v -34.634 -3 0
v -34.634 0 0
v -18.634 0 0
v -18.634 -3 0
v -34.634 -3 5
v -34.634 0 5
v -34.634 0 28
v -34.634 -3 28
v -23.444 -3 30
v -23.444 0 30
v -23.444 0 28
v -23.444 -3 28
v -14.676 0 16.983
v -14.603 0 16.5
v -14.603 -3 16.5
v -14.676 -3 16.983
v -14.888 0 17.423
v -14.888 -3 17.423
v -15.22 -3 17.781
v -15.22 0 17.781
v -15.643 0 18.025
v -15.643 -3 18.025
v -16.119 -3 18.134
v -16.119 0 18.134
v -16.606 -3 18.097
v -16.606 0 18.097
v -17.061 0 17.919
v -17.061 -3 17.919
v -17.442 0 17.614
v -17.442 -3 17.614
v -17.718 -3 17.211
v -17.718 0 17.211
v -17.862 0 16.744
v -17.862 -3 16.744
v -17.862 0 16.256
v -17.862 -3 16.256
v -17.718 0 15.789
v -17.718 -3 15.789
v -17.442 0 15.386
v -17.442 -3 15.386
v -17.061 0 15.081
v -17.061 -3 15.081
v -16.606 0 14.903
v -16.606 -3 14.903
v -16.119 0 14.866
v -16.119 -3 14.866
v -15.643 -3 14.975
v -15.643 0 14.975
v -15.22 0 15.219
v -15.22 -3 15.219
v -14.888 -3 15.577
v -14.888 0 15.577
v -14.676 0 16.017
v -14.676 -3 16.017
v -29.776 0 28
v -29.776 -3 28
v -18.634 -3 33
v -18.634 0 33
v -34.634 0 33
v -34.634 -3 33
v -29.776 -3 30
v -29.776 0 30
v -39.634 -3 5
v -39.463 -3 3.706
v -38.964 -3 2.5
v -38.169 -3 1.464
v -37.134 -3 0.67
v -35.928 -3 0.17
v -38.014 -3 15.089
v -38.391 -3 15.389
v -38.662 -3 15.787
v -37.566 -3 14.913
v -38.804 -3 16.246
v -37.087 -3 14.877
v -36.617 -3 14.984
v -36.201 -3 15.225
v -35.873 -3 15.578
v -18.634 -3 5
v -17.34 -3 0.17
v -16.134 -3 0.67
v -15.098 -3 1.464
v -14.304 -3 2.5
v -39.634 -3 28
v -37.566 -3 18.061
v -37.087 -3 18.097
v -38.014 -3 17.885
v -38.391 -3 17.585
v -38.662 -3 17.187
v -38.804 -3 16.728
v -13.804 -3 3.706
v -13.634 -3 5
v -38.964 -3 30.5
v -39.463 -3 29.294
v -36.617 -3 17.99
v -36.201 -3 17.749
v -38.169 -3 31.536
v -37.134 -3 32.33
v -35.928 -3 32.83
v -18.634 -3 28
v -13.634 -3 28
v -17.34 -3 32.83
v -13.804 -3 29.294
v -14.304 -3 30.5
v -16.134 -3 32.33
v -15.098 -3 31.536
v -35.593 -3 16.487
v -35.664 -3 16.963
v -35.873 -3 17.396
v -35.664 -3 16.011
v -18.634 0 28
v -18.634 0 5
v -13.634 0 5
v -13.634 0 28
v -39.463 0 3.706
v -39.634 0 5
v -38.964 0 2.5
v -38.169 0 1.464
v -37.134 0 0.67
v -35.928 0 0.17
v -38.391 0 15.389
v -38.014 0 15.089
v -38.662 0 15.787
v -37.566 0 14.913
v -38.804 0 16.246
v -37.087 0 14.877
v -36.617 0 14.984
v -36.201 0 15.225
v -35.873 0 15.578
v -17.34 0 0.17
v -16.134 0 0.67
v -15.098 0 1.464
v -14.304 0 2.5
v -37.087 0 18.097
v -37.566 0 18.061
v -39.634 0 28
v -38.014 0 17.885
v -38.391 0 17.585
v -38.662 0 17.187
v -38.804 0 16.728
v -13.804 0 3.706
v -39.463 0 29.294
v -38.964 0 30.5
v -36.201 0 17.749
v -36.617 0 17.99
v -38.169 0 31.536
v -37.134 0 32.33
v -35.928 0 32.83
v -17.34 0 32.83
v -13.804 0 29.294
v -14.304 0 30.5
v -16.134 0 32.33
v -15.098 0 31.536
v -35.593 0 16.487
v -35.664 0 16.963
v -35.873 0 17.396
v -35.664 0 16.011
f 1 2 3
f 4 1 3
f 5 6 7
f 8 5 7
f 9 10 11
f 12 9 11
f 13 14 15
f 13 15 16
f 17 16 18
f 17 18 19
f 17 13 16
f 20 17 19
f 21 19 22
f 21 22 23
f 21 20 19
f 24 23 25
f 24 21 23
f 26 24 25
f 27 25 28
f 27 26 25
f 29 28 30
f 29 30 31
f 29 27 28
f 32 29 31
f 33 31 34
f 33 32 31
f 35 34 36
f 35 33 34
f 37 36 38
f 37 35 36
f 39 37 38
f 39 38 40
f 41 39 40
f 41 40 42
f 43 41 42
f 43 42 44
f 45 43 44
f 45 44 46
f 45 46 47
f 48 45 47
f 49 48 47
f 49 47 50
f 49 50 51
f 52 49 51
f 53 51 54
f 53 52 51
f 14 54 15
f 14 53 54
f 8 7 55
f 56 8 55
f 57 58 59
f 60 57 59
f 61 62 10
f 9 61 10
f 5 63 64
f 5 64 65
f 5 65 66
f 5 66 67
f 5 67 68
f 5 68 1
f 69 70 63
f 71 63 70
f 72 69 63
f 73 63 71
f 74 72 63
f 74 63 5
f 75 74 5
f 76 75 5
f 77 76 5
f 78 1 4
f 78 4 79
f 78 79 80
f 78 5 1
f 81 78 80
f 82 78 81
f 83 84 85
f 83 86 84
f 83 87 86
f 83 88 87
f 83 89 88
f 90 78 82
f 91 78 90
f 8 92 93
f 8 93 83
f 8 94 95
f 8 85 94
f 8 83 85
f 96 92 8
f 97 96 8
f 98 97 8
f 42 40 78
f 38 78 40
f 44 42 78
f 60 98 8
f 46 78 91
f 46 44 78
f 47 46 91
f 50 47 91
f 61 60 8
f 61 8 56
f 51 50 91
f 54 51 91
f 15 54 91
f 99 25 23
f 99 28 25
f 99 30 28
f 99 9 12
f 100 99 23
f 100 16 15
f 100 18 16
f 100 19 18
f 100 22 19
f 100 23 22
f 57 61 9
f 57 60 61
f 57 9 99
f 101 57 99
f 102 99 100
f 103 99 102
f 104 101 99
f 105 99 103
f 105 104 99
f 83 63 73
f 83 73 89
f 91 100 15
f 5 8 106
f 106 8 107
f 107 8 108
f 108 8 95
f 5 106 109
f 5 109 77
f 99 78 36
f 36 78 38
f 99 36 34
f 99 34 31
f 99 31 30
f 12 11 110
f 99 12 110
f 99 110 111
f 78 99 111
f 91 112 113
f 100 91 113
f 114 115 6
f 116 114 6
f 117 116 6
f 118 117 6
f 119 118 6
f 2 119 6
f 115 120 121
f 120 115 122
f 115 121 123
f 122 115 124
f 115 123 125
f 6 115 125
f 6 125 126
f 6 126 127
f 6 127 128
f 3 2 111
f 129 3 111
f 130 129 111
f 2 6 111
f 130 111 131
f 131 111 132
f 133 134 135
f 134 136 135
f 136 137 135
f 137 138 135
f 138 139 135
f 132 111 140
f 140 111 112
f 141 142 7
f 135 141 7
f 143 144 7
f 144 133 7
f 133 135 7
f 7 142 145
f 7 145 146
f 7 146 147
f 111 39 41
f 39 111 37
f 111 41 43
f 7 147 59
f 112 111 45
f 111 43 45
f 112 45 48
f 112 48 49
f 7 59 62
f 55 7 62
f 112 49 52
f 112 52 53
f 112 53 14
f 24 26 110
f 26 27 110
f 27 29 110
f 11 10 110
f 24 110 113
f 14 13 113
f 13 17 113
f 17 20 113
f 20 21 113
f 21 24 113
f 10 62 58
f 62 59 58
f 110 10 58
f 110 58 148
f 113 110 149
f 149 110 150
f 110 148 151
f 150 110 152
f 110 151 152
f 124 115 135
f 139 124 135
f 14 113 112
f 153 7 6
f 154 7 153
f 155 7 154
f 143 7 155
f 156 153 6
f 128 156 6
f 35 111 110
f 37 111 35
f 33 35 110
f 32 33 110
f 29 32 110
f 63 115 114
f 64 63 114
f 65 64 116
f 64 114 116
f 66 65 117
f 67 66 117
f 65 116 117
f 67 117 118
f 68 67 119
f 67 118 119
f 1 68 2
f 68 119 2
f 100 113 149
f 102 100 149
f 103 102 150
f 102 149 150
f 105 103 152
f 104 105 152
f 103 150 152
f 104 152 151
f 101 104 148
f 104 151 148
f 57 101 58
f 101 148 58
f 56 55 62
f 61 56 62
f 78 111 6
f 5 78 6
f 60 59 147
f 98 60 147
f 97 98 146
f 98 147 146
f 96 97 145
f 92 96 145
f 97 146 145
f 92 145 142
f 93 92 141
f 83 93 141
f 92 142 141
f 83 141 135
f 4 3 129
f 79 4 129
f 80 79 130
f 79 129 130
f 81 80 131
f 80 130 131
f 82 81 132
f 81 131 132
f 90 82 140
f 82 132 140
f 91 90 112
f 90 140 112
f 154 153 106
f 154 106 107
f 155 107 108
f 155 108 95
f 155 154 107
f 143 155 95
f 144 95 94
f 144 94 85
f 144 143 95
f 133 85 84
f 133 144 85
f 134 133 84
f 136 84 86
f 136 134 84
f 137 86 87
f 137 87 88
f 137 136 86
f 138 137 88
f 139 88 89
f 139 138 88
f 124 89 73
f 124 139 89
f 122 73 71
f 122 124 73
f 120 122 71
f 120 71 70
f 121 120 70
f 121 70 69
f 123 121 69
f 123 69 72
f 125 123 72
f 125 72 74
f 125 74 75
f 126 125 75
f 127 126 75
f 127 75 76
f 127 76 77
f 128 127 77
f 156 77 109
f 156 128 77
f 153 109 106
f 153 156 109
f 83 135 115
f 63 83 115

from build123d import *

# Parameters (mm, degrees)
F0_R     = 1.6143877839
F0_R_2   = 1.6384664926
F1_DEPTH = 3


# Not quite as in the source:
# - a feature names something its author has since deleted; it is built from what else it names


with BuildPart() as f1:
    # F0 (on Front) → F1 (new body)
    with BuildSketch(Plane.XZ):
        with BuildLine():
            Line((-39.6336754784, 28), (-39.6336754784, 5))
            ThreePointArc((-39.6336754784, 5), (-38.1692093843, 1.4644660941), (-34.6336754784, 0))
            Line((-34.6336754784, 0), (-18.6336754784, 0))
            ThreePointArc((-18.6336754784, 0), (-15.0981415725, 1.4644660941), (-13.6336754784, 5))
            Line((-13.6336754784, 5), (-13.6336754784, 28))
            ThreePointArc((-13.6336754784, 28), (-15.0981415725, 31.5355339059), (-18.6336754784, 33))
            Line((-18.6336754784, 33), (-34.6336754784, 33))
            ThreePointArc((-34.6336754784, 33), (-38.1692093843, 31.5355339059), (-39.6336754784, 28))
        make_face()
        with Locations((-37.207160145, 16.4869632572)):
            Circle(F0_R, mode=Mode.SUBTRACT)
        Polygon((-34.6336754784, 5), (-34.6336754784, 16.5), (-34.6336754784, 28), (-29.7759659588, 28), (-29.7759659588, 30), (-23.4435740858, 30), (-23.4435740858, 28), (-18.6336754784, 28), (-18.6336754784, 5), align=None, mode=Mode.SUBTRACT)
        with Locations((-16.2413809448, 16.5)):
            Circle(F0_R_2, mode=Mode.SUBTRACT)
    extrude(amount=F1_DEPTH)


solid = f1.part
